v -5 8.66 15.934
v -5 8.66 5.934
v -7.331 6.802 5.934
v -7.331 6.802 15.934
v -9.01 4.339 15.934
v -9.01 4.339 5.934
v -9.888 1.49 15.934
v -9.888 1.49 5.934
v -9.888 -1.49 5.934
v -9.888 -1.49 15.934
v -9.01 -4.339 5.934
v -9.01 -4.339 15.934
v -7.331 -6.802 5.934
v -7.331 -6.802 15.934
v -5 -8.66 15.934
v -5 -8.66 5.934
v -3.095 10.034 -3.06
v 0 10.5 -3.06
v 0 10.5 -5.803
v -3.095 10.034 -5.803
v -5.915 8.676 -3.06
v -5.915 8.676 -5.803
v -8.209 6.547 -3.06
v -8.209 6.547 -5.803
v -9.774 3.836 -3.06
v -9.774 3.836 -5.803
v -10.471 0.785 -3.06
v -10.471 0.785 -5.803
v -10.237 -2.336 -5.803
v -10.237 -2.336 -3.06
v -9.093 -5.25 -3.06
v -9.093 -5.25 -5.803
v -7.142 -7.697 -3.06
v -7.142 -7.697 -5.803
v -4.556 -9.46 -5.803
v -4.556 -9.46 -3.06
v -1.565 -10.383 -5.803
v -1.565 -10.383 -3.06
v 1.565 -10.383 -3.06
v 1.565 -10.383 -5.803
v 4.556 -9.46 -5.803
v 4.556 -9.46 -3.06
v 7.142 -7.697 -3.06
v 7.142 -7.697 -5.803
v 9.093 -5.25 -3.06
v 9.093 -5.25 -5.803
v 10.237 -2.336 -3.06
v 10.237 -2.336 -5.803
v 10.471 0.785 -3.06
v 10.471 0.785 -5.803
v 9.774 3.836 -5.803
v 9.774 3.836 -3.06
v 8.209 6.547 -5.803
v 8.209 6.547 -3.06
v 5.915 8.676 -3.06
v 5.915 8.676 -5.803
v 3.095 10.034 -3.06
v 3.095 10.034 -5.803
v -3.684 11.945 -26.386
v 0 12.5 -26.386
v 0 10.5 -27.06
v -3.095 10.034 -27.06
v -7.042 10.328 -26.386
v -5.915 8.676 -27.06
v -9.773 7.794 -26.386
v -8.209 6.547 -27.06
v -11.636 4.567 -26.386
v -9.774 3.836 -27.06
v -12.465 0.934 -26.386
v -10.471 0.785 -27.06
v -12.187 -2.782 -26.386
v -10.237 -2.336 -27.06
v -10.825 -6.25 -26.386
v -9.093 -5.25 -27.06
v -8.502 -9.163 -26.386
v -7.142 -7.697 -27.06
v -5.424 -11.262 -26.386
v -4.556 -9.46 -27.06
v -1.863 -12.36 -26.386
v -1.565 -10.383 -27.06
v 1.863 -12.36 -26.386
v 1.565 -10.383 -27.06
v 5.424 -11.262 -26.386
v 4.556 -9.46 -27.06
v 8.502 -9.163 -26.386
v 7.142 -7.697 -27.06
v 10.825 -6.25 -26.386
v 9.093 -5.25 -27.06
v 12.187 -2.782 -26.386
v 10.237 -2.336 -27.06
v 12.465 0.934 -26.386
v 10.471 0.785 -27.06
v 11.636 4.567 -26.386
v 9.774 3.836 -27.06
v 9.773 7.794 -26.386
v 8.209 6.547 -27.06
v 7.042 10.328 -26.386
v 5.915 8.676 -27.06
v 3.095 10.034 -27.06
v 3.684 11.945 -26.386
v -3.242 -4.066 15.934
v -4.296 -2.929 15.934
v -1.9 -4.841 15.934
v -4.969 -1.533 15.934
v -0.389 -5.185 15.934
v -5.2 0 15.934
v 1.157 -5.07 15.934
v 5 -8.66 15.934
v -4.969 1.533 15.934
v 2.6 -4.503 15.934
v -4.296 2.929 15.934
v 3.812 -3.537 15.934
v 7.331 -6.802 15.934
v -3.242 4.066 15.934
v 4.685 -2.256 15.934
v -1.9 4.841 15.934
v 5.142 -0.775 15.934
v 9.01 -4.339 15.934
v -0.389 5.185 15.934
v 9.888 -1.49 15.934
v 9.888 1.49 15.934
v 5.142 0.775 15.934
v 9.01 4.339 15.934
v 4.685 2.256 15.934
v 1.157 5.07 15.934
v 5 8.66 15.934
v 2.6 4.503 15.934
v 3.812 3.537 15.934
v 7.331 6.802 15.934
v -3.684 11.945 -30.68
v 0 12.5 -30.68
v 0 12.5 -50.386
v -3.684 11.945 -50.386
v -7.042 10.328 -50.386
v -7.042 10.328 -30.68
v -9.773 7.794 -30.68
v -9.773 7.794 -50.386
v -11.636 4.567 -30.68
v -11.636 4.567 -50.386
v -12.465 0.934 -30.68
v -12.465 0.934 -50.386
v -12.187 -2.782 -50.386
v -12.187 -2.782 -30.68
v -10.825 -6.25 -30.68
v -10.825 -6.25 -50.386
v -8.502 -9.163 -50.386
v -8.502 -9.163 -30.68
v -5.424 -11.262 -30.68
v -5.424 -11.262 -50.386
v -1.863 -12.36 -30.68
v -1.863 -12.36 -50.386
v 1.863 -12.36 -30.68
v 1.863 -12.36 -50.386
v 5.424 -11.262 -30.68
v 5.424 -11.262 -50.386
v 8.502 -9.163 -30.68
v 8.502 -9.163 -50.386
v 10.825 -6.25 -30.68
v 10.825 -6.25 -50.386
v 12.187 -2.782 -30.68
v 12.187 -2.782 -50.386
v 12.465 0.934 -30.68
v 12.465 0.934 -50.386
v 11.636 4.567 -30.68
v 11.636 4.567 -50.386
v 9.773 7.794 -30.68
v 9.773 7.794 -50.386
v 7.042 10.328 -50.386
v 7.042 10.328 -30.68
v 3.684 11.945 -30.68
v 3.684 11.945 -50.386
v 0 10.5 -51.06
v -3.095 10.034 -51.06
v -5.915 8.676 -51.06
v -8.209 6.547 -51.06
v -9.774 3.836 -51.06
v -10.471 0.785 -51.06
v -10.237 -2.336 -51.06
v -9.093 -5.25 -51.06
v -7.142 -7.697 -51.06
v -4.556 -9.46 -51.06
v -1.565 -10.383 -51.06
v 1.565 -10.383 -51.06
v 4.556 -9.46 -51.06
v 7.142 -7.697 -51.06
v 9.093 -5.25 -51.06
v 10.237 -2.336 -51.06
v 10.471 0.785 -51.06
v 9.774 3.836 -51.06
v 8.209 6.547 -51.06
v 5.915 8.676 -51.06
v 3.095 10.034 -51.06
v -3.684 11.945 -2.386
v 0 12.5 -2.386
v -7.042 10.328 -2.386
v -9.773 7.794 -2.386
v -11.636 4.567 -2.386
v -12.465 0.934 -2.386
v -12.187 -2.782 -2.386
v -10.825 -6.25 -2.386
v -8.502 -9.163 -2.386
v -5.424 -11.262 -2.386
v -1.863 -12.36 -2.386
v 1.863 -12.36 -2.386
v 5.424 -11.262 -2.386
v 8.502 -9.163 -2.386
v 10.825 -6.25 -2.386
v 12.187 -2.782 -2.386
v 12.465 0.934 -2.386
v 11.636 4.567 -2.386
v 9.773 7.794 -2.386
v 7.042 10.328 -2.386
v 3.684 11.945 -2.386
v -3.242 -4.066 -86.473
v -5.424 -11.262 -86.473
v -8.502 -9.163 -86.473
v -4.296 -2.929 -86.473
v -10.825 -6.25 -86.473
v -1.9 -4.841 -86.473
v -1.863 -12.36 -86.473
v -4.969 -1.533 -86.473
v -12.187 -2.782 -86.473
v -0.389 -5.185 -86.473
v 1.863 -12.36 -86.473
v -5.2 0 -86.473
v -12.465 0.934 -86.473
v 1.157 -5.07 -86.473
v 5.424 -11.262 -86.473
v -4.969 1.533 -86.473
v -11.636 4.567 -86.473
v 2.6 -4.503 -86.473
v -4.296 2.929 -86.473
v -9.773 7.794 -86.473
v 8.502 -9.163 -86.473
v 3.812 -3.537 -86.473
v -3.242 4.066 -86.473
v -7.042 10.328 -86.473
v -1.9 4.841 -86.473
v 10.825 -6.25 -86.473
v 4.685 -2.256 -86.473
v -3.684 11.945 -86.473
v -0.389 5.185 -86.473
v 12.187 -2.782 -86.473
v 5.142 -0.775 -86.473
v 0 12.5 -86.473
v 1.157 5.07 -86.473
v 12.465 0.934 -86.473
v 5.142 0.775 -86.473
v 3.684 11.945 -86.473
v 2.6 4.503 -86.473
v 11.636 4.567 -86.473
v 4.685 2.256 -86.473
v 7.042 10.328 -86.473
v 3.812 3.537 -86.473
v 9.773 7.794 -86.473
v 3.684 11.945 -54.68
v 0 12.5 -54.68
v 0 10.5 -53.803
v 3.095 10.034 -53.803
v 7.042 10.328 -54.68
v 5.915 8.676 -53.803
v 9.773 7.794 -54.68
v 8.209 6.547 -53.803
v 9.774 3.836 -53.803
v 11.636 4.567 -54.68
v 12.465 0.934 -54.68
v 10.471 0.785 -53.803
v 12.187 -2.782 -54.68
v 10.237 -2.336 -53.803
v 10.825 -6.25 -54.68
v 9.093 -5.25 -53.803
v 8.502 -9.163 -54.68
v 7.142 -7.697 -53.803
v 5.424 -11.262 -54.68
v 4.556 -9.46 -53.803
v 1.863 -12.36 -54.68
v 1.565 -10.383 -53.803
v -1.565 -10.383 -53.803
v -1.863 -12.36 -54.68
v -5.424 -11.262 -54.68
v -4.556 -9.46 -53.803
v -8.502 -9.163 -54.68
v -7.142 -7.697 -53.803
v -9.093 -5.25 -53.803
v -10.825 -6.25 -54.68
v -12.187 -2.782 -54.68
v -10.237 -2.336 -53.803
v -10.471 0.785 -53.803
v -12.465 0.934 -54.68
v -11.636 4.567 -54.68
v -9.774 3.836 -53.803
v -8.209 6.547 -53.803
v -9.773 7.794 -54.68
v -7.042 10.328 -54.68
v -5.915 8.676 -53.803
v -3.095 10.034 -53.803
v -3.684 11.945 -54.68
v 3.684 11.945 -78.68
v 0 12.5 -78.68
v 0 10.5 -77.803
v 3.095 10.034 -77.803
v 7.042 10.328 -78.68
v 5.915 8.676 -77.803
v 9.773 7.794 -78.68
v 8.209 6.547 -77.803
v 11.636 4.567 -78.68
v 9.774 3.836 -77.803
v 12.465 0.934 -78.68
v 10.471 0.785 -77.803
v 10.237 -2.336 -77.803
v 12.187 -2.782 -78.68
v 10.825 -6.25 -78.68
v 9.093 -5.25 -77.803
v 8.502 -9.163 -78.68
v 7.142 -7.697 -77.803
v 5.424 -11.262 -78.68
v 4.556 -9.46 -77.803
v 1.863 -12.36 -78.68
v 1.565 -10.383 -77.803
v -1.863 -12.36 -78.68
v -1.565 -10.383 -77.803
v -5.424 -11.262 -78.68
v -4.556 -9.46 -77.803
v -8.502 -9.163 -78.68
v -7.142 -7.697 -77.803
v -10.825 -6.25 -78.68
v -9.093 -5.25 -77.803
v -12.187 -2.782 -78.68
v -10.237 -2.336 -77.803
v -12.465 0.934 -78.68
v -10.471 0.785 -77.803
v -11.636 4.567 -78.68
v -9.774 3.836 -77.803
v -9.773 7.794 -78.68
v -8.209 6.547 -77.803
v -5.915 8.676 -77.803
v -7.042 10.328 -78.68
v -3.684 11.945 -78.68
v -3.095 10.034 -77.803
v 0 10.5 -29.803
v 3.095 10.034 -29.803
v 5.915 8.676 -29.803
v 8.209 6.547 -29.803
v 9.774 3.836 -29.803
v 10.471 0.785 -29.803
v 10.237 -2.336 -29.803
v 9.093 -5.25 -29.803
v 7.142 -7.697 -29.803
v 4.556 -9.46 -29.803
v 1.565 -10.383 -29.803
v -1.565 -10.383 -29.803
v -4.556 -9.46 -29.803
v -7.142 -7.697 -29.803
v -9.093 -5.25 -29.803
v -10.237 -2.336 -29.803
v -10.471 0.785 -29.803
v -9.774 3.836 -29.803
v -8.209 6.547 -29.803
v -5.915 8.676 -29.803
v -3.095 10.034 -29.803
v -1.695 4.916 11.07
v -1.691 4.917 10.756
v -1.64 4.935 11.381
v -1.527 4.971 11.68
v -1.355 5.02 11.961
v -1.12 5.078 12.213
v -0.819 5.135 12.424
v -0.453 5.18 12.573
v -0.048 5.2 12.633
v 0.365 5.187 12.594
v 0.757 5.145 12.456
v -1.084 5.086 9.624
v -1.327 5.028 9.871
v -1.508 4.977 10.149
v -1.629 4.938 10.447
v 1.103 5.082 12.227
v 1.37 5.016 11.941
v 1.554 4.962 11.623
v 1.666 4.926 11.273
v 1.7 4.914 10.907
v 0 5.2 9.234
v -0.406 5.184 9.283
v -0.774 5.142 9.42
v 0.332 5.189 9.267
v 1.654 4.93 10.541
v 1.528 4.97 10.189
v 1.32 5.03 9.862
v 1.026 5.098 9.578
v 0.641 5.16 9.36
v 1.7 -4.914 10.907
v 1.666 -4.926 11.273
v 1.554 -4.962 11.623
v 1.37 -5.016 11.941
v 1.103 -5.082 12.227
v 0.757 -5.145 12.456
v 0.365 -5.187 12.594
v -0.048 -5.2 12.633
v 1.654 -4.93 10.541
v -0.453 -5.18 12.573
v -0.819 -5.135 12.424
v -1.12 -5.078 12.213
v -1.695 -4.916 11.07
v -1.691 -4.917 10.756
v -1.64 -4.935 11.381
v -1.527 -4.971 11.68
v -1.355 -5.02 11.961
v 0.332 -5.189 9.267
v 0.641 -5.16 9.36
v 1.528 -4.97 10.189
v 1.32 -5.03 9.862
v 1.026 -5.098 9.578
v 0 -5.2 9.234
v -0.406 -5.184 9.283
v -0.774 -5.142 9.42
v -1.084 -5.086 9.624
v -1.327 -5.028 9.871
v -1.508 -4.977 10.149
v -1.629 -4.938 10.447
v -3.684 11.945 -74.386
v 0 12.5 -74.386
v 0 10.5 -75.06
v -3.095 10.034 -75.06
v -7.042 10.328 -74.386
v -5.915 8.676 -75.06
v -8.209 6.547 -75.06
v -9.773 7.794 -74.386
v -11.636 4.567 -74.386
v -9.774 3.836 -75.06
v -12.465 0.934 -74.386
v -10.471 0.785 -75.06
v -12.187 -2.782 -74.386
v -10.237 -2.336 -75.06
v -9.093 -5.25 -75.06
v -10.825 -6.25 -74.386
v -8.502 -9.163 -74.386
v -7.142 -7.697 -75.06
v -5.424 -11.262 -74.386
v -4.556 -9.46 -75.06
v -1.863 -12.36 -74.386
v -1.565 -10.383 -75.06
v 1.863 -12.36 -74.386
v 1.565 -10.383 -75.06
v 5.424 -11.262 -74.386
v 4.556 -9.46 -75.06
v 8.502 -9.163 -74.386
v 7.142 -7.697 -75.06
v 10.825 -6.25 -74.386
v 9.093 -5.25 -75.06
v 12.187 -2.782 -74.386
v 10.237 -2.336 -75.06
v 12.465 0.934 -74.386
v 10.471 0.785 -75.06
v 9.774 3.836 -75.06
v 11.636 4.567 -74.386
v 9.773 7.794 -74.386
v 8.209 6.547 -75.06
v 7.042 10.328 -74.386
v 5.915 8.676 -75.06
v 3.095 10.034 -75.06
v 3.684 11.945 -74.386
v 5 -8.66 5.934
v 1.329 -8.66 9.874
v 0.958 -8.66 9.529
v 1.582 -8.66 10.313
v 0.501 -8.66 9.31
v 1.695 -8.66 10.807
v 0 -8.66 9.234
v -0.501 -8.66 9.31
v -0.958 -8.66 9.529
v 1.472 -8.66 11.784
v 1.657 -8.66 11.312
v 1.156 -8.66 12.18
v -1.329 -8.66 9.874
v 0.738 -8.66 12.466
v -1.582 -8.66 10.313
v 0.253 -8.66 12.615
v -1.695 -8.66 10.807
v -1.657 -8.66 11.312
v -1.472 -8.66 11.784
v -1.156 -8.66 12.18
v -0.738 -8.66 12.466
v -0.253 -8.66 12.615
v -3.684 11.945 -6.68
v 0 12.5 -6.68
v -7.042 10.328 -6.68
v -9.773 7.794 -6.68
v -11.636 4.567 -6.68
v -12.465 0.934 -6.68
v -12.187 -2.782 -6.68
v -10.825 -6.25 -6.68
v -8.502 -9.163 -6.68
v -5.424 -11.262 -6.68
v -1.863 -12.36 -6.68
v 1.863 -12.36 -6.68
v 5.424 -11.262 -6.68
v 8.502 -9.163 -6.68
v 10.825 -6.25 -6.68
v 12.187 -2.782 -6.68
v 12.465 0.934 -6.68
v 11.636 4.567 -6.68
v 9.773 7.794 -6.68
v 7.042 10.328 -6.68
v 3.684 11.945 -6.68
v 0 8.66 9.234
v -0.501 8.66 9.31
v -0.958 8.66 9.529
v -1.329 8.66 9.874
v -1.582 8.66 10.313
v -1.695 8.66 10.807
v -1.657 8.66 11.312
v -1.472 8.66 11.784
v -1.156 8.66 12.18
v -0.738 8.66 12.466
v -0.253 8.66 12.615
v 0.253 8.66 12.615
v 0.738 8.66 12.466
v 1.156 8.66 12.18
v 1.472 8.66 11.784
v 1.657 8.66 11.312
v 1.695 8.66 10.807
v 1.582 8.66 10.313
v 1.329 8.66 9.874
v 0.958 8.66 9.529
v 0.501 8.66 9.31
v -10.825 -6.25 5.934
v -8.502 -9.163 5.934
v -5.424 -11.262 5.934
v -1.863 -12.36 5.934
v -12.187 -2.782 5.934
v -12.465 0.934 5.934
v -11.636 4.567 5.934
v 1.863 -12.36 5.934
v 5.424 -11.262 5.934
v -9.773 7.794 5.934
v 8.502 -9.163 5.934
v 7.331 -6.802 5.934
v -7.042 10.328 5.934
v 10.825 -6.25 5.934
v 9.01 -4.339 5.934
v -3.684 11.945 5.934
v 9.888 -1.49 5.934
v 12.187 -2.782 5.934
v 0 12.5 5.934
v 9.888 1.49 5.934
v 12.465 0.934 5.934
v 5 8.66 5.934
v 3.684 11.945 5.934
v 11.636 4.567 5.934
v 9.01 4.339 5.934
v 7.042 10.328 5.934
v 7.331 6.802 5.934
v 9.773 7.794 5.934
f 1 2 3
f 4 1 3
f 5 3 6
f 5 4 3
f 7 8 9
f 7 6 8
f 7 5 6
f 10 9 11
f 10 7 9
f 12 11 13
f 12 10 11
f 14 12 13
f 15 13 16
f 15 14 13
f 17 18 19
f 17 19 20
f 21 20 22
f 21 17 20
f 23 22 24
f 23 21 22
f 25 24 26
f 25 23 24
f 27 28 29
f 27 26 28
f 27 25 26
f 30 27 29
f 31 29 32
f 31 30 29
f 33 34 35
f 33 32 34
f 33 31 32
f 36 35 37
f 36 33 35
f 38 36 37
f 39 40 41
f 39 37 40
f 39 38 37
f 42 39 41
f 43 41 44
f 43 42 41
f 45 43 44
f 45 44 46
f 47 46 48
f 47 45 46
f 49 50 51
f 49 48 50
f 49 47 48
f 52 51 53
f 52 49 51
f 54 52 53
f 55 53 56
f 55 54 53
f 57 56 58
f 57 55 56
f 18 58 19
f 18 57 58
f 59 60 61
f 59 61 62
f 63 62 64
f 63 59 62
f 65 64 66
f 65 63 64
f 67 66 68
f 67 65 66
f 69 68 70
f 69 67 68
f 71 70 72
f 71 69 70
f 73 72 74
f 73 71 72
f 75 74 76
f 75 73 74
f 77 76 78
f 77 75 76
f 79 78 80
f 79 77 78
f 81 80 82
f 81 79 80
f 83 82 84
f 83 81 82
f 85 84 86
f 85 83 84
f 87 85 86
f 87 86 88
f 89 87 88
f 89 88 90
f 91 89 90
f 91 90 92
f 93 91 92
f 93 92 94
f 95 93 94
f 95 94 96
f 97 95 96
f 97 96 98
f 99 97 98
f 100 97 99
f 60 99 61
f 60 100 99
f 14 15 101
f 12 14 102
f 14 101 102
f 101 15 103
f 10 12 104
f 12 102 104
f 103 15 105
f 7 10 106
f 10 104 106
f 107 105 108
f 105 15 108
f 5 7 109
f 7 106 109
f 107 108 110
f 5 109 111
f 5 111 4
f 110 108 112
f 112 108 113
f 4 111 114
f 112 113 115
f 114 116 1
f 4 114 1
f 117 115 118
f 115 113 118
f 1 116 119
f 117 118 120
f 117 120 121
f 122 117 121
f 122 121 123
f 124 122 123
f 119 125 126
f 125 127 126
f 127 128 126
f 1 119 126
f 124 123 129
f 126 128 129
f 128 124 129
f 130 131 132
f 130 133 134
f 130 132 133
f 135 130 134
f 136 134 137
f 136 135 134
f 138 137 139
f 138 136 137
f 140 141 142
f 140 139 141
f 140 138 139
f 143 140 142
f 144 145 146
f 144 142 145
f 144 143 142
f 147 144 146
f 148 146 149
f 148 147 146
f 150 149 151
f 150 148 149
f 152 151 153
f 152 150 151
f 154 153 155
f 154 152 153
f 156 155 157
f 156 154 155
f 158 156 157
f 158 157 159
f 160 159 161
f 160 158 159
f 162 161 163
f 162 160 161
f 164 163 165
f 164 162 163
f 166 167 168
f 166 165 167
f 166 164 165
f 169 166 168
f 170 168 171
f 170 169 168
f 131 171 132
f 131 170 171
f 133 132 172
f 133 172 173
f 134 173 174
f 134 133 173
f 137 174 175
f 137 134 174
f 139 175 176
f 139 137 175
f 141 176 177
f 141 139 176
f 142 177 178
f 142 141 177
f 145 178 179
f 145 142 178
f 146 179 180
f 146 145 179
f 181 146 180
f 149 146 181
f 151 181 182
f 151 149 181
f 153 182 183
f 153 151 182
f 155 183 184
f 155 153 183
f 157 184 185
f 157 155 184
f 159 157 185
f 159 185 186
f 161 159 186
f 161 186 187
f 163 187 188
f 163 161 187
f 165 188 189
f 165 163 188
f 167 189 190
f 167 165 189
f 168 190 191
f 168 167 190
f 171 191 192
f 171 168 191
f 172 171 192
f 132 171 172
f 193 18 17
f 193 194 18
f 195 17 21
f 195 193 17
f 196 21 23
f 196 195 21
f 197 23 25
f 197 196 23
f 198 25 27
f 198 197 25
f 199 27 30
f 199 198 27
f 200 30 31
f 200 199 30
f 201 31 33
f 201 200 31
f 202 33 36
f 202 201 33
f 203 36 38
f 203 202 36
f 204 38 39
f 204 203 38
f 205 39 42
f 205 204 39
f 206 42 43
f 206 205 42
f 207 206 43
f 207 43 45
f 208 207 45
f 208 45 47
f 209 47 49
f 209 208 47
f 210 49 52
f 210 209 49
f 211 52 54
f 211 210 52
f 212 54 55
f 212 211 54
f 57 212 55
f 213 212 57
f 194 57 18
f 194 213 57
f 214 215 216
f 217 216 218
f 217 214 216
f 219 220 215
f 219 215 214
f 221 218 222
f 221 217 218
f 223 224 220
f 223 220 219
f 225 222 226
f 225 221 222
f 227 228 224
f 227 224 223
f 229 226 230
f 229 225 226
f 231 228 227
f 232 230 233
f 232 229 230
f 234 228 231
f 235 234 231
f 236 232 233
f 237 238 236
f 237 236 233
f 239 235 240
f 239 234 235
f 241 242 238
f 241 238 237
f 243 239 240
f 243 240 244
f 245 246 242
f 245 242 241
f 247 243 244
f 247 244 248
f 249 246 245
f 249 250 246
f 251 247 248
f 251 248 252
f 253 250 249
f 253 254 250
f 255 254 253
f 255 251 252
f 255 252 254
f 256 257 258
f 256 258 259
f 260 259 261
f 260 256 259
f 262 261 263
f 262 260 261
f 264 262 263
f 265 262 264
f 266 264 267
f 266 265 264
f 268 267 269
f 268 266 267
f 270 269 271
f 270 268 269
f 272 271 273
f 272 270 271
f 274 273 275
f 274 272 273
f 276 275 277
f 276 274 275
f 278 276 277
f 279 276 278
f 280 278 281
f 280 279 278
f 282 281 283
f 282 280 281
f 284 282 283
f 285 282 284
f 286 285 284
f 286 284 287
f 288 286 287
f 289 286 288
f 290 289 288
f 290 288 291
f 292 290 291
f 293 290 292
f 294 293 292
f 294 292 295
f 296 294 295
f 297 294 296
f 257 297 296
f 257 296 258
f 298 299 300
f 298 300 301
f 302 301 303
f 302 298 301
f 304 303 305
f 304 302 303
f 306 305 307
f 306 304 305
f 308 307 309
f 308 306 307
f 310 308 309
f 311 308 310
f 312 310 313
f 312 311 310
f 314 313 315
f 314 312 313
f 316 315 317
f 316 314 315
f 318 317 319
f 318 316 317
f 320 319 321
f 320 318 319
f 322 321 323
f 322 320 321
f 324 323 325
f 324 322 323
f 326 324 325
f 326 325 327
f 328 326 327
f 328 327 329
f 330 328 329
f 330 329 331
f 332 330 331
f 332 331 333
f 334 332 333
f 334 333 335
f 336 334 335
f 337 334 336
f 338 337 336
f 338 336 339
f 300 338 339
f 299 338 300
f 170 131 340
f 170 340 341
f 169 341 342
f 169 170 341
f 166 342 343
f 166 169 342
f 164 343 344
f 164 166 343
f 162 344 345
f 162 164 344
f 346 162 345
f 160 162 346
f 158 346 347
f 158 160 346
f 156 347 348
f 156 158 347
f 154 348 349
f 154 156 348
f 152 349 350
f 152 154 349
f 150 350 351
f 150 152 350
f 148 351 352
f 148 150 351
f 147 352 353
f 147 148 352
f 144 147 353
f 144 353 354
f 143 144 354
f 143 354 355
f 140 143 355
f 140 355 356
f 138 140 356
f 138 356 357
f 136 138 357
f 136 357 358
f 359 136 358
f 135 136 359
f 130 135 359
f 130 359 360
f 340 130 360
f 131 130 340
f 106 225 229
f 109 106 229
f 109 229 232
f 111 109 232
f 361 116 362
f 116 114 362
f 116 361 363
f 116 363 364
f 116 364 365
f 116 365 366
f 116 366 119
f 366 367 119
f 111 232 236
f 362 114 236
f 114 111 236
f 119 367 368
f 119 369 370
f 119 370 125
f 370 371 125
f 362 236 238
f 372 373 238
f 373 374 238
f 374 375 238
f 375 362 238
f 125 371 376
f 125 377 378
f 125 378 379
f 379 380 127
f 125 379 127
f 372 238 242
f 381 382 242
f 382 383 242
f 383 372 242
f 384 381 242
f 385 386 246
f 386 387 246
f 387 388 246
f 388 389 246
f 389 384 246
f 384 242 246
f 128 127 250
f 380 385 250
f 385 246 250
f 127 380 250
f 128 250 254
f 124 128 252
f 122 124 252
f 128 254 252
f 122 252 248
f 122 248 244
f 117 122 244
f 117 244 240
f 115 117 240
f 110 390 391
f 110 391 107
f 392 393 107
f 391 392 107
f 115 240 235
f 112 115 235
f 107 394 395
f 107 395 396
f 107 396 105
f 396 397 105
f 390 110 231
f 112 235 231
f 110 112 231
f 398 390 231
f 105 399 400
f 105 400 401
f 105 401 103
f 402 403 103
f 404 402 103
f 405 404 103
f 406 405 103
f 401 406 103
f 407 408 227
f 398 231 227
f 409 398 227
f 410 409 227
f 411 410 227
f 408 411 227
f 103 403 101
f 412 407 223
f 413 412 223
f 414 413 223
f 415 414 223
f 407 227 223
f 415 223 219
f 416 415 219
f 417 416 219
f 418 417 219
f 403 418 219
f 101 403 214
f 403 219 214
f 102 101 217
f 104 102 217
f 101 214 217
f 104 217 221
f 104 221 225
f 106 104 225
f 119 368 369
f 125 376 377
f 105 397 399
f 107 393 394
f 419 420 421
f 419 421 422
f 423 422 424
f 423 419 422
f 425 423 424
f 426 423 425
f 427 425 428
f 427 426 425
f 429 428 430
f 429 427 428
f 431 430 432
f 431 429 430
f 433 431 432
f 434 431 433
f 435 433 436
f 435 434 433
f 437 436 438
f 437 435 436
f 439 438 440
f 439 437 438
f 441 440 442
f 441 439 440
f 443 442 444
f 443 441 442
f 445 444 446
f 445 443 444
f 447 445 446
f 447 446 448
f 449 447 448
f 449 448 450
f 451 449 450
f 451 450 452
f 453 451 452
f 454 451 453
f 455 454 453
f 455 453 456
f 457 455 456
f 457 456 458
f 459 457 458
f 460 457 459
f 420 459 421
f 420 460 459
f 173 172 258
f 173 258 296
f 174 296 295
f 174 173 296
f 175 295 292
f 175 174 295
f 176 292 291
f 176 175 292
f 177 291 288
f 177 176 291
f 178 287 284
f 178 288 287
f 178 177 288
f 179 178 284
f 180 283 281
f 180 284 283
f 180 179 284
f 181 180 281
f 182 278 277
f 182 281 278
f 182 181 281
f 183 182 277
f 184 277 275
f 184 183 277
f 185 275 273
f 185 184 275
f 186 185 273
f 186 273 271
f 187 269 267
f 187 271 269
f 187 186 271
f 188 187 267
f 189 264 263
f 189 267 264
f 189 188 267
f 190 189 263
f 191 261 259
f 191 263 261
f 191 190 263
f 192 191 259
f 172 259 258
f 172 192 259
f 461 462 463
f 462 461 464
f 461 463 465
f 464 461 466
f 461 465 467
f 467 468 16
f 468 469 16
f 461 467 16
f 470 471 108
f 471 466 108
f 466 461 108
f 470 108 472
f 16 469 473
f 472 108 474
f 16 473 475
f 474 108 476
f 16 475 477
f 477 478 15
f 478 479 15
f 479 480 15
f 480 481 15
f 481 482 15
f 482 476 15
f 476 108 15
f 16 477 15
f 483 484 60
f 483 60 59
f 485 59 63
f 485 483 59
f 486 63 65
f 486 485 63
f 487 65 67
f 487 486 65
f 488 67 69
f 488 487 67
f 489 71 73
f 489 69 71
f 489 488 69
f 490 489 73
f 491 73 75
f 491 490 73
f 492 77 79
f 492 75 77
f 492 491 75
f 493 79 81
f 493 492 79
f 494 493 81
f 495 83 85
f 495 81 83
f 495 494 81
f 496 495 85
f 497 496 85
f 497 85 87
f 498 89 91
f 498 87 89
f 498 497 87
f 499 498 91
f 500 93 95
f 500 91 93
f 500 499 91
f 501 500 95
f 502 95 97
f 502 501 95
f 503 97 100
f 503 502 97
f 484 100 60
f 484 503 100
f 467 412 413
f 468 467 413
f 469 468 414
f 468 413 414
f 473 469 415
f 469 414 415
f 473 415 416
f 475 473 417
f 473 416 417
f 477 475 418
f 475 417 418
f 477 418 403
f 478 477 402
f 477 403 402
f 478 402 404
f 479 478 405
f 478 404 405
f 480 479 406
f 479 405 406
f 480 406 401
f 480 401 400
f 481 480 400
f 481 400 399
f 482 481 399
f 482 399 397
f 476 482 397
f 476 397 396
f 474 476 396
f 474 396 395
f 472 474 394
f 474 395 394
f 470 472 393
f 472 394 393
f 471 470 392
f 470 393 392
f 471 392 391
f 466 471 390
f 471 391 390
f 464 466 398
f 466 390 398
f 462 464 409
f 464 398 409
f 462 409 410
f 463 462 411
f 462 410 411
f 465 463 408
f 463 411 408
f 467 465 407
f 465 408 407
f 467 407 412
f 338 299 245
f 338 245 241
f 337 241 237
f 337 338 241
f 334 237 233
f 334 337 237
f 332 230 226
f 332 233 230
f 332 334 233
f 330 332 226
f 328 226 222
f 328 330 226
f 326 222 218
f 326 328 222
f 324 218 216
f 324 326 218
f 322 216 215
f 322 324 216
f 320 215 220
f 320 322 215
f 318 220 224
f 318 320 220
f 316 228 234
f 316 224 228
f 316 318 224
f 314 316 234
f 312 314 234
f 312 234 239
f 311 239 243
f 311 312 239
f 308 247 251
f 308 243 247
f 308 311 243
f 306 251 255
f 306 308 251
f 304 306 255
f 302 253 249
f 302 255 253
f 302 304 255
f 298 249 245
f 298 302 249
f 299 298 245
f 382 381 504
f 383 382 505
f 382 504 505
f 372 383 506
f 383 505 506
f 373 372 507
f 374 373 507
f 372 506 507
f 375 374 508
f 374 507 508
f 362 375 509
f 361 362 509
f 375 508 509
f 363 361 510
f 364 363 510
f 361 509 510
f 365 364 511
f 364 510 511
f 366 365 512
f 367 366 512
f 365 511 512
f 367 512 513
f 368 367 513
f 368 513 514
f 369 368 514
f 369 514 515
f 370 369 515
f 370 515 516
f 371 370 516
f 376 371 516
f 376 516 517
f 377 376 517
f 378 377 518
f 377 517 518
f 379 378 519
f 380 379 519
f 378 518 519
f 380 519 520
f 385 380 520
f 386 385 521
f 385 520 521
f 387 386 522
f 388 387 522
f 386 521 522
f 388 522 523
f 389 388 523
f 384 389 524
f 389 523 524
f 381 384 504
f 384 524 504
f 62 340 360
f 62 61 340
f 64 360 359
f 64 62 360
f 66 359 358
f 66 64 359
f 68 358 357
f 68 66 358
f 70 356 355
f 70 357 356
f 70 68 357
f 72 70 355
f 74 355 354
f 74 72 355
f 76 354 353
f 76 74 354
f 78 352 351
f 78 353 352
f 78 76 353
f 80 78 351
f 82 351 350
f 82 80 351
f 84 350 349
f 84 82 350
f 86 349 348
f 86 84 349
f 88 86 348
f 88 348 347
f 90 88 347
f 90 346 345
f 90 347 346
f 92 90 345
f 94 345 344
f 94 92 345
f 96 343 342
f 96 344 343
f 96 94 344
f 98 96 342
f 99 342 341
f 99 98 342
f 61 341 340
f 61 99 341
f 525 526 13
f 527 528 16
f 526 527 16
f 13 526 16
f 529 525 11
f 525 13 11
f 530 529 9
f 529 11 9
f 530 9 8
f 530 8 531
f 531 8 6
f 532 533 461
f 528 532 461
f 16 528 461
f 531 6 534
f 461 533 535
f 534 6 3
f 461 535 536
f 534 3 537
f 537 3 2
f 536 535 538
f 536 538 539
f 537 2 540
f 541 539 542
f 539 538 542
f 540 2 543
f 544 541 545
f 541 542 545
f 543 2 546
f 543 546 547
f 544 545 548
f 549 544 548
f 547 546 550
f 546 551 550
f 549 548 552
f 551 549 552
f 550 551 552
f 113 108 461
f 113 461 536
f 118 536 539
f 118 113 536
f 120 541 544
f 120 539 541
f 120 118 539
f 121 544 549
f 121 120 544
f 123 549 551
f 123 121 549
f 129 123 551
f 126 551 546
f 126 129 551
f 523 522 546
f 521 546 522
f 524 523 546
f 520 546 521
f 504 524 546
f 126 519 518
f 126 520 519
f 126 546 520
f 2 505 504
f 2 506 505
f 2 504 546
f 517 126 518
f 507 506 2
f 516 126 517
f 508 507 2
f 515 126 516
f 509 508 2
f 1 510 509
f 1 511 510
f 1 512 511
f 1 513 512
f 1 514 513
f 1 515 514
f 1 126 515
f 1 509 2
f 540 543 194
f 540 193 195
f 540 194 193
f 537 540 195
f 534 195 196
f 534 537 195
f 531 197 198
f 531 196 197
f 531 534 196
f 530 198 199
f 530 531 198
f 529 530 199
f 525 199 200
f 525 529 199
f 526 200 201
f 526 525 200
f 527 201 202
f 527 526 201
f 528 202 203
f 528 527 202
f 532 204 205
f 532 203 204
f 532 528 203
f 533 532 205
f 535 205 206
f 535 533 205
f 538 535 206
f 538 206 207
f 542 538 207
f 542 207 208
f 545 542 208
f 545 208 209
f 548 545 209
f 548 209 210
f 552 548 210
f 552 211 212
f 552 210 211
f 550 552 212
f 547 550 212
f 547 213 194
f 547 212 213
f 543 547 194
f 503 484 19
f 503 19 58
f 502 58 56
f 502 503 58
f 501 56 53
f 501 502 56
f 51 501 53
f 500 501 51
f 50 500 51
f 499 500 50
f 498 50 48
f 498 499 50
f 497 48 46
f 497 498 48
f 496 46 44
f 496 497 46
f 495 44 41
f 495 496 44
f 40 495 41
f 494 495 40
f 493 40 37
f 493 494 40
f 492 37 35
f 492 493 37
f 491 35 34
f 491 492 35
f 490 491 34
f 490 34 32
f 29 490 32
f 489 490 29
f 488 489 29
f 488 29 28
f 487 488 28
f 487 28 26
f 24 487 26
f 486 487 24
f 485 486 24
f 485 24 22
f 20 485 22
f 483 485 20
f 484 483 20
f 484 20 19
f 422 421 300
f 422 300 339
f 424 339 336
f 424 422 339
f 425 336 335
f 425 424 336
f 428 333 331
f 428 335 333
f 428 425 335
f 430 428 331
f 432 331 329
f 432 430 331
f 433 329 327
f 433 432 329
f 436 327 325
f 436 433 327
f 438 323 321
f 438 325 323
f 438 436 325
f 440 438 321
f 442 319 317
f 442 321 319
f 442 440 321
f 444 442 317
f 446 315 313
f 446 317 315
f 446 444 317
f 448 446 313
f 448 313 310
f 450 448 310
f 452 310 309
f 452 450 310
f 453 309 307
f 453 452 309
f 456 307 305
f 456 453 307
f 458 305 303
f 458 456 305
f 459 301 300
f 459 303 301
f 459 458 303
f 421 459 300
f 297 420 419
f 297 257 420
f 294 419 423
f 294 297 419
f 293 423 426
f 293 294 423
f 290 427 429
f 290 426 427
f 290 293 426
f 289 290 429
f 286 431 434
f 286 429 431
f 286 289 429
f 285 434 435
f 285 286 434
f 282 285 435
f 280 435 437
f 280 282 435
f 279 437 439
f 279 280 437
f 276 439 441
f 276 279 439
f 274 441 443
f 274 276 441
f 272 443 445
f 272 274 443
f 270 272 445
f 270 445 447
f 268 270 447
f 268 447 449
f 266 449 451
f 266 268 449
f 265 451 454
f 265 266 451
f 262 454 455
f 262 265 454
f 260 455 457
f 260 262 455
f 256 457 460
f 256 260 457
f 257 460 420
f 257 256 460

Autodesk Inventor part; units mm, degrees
ref_plane "YZ Plane" through (0, 0, 0) normal (1, 0, 0) x (0, 1, 0)
ref_plane "XY Plane" through (0, 0, 0) normal (0, 0, 1) x (1, 0, 0)
sketch "スケッチ1" plane through (0, 0, 0) normal (1, 0, 0) x (0, 1, 0)
  line L0 (0, -9.065995) -> (0, 0.934005)
  line L1 (0, 0) -> (12.5, 0)
  line L2 (12.5, 0) -> (12.5, -2.385786)
  line L3 (12.5, -2.385786) -> (10.5, -3.060246)
  line L4 (10.5, -3.060246) -> (10.5, -5.803392)
  line L5 (10.5, -5.803392) -> (12.5, -6.680209)
  line L6 (12.5, -6.680209) -> (12.5, -9.065995)
  line L7 (12.5, -9.065995) -> (0, -9.065995)
  line L8 (0, -9.065995) -> (0, 0)
  line L9 (10.5, -4.431819) -> (0, -4.532998)
  line L10 (10.5, -27.060246) -> (10.5, -29.803392)
  line L11 (12.5, -30.680209) -> (12.5, -33.065995)
  line L12 (10.5, -29.803392) -> (12.5, -30.680209)
  line L13 (12.5, -26.385786) -> (10.5, -27.060246)
  line L14 (12.5, -24) -> (12.5, -26.385786)
  line L15 (0, -24) -> (12.5, -24)
  line L16 (12.5, -33.065995) -> (0, -33.065995)
  line L17 (10.5, -28.431819) -> (0, -28.532998)
  line L18 (0, -33.065995) -> (0, -23.065995)
  line L19 (0, -33.065995) -> (0, -24)
  line L20 (10.5, -51.060246) -> (10.5, -53.803392)
  line L21 (12.5, -54.680209) -> (12.5, -57.065995)
  line L22 (10.5, -53.803392) -> (12.5, -54.680209)
  line L23 (12.5, -50.385786) -> (10.5, -51.060246)
  line L24 (12.5, -48) -> (12.5, -50.385786)
  line L25 (0, -48) -> (12.5, -48)
  line L26 (12.5, -57.065995) -> (0, -57.065995)
  line L27 (10.5, -52.431819) -> (0, -52.532998)
  line L28 (0, -57.065995) -> (0, -47.065995)
  line L29 (0, -57.065995) -> (0, -48)
  line L30 (10.5, -75.060246) -> (10.5, -77.803392)
  line L31 (12.5, -78.680209) -> (12.5, -81.065995)
  line L32 (10.5, -77.803392) -> (12.5, -78.680209)
  line L33 (12.5, -74.385786) -> (10.5, -75.060246)
  line L34 (12.5, -72) -> (12.5, -74.385786)
  line L35 (0, -72) -> (12.5, -72)
  line L36 (12.5, -81.065995) -> (0, -81.065995)
  line L37 (10.5, -76.431819) -> (0, -76.532998)
  line L38 (0, -81.065995) -> (0, -71.065995)
  line L39 (0, -81.065995) -> (0, -72)
  line L40 (0, -81.065995) -> (12.5, -81.065995)
  line L41 (12.5, -81.065995) -> (12.5, -86.473236)
  line L42 (12.5, -86.473236) -> (0, -86.473236)
  line L43 (0, -86.473236) -> (0, -81.065995)
  line L44 (12.5, -72) -> (12.5, -57.065995)
  line L45 (12.5, -48) -> (12.5, -33.065995)
  line L46 (12.5, -24) -> (12.5, -9.065995)
  line L47 (0, 0) -> (12.5, 0)
  line L48 (12.5, 0) -> (12.5, 5.934005)
  line L49 (12.5, 5.934005) -> (0, 5.934005)
  line L50 (0, 5.934005) -> (0, 0)
  line L51 (0, 5.934005) -> (10, 5.934005)
  line L52 (10, 5.934005) -> (10, 15.934005)
  line L53 (10, 15.934005) -> (0, 15.934005)
  line L54 (0, 15.934005) -> (0, 5.934005)
  line L55 (0, 15.934005) -> (0, -71.065995)
  circle A0 centre (12.5, -4.496449) radius 2
  point P0 (0, 0)
  point P1 (6.25, -86.473236)
  point P2 (0, -4.065995)
  point P3 (0, 0)
  point P4 (0, -23.065995)
  point P5 (0, -33.065995)
  point P6 (0, -47.065995)
  point P7 (0, -57.065995)
  point P8 (10, 5.934005)
  dimension "d1" = 2.74315
  dimension "d2" = 12.5
  dimension "d7" = 12.5
  dimension "d8" = 10
  dimension "d9" = 2.38579
  dimension "d10" = 2.38579
  dimension "d11" = 90
  dimension "d12" = 90
  dimension "d13" = 90
  dimension "d14" = 0
  dimension "d17" = 24
  dimension "d22" = 10
  dimension "d23" = 0
  dimension "d24" = 0
  dimension "d25" = 10
  dimension "d26" = 10
  dimension "d27" = 10
  dimension "d44" = 4
  dimension "d45" = 10.5
  dimension "d46" = 108.636
sketch "スケッチ1 outline for 回転1" plane through (0, 0, 0) normal (1, 0, 0) x (0, 1, 0)
  line L0 (10, 15.934005) -> (0, 15.934005)
  line L1 (10, 5.934005) -> (10, 15.934005)
  line L2 (12.5, 5.934005) -> (10, 5.934005)
  line L3 (12.5, 0) -> (12.5, 5.934005)
  line L4 (12.5, -2.385786) -> (12.5, 0)
  line L5 (10.5, -3.060246) -> (12.5, -2.385786)
  line L6 (10.5, -5.803392) -> (10.5, -3.060246)
  line L7 (12.5, -6.680209) -> (10.5, -5.803392)
  line L8 (12.5, -9.065995) -> (12.5, -6.680209)
  line L9 (12.5, -24) -> (12.5, -9.065995)
  line L10 (12.5, -26.385786) -> (12.5, -24)
  line L11 (10.5, -27.060246) -> (12.5, -26.385786)
  line L12 (10.5, -29.803392) -> (10.5, -27.060246)
  line L13 (12.5, -30.680209) -> (10.5, -29.803392)
  line L14 (12.5, -33.065995) -> (12.5, -30.680209)
  line L15 (12.5, -48) -> (12.5, -33.065995)
  line L16 (12.5, -50.385786) -> (12.5, -48)
  line L17 (10.5, -51.060246) -> (12.5, -50.385786)
  line L18 (10.5, -53.803392) -> (10.5, -51.060246)
  line L19 (12.5, -54.680209) -> (10.5, -53.803392)
  line L20 (12.5, -57.065995) -> (12.5, -54.680209)
  line L21 (12.5, -72) -> (12.5, -57.065995)
  line L22 (12.5, -74.385786) -> (12.5, -72)
  line L23 (10.5, -75.060246) -> (12.5, -74.385786)
  line L24 (10.5, -77.803392) -> (10.5, -75.060246)
  line L25 (12.5, -78.680209) -> (10.5, -77.803392)
  line L26 (12.5, -81.065995) -> (12.5, -78.680209)
  line L27 (12.5, -86.473236) -> (12.5, -81.065995)
  line L28 (0, -86.473236) -> (12.5, -86.473236)
  line L29 (0, -81.065995) -> (0, -86.473236)
  line L30 (0, -71.065995) -> (0, -81.065995)
  line L31 (0, -57.065995) -> (0, -71.065995)
  line L32 (0, -47.065995) -> (0, -57.065995)
  line L33 (0, -33.065995) -> (0, -47.065995)
  line L34 (0, -23.065995) -> (0, -33.065995)
  line L35 (0, -9.065995) -> (0, -23.065995)
  line L36 (0, 0) -> (0, -9.065995)
  line L37 (0, 5.934005) -> (0, 0)
  line L38 (0, 15.934005) -> (0, 5.934005)
revolve "回転1" add sketch "スケッチ1 outline for 回転1" angle 360 about axis through (0, 0, 15.934005) along (0, 0, -1)
sketch "スケッチ2" plane through (0, 0, -86.473236) normal (0, 0, -1) x (-1, 0, 0)
  circle A0 centre (0, 0) radius 5.2
  point P0 (0, 0)
  dimension "d29" = 10.4
extrude "押し出し1" cut sketch "スケッチ2" against normal through all
ref_plane "作業平面1" through (0, -10, 10.934005) normal (0, 1, 0) x (-1, 0, 0)
sketch "スケッチ3" plane through (0, -10, 10.934005) normal (0, 1, 0) x (-1, 0, 0)
  line L0 (-10, 5) -> (10, 5) projected
  point P0 (0, -10.934005)
  point P1 (0, 0)
  dimension "d32" = 5
hole "穴1" at (0, -10, 10.934005) direction (0, 1, 0) diameter 3.4 end through all
sketch "スケッチ4" plane through (0, 0, 15.934005) normal (0, 0, 1) x (1, 0, 0)
  circle A0 centre (0, 0) radius 10
  line L0 (5, -8.660254) -> (-5, -8.660254)
  line L1 (10, 0) -> (-10, 0)
  line L2 (5, 8.660254) -> (-5, 8.660254)
  point P0 (0, 0)
  dimension "d40" = 10
  dimension "d41" = 20
extrude "押し出し2" cut sketch "スケッチ4" against normal blind 10 contours L2 A0 | A0 L0
properties part number "ball_loading_v1_3DP_P_B" material "ABS プラスチック"
